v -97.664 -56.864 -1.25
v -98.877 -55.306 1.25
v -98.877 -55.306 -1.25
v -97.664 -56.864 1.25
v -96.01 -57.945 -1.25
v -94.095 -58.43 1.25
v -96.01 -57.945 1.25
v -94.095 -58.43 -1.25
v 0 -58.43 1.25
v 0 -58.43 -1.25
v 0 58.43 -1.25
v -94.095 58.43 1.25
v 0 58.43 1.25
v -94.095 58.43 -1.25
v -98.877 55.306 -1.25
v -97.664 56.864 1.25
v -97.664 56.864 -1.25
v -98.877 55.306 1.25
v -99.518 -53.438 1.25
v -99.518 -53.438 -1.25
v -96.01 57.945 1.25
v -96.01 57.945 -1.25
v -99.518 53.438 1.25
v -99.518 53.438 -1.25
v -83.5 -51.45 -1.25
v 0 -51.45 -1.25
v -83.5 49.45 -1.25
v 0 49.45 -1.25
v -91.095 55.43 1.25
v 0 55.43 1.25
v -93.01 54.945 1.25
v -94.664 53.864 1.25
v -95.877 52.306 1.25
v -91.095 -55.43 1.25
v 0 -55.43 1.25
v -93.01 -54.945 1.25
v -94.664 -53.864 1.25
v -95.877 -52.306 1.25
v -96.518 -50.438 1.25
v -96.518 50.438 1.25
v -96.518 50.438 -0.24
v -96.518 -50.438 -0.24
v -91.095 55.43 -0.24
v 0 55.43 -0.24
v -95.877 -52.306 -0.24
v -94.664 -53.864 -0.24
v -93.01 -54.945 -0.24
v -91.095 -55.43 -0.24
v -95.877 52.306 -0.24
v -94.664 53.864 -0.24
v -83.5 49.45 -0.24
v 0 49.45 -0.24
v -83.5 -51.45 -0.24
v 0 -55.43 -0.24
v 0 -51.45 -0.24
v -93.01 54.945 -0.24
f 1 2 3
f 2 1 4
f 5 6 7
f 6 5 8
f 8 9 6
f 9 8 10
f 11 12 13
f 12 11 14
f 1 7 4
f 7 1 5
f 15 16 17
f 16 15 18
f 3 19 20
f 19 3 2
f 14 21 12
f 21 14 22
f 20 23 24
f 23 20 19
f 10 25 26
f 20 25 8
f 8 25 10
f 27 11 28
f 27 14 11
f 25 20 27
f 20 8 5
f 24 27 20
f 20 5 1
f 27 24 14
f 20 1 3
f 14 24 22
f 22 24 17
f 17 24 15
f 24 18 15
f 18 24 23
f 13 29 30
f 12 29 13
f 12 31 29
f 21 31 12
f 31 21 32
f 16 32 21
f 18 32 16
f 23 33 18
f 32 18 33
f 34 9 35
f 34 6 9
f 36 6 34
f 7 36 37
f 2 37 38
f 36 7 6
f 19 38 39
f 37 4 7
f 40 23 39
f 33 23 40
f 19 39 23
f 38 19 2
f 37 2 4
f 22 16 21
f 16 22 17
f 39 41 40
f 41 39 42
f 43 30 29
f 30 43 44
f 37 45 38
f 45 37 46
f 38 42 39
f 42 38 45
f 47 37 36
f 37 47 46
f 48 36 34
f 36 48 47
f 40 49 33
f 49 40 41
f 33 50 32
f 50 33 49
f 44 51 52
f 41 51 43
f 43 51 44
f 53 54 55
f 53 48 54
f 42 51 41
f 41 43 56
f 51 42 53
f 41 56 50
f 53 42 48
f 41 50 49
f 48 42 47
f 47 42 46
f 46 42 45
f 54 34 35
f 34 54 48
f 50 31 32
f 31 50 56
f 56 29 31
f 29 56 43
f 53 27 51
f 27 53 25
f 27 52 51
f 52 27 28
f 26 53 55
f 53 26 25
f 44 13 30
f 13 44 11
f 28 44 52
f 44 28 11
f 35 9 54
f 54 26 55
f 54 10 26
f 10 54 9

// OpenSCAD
side=1;
wid1=110.9;

if (side==1) {
    difference() {
        touch_screen();
        translate([100,0,0]) cube([200,200,200],true);
    }
}
else if (side==2) {
    difference() {
        touch_screen();
        translate([-100,0,0]) cube([200,200,200],true);
    }
}


module touch_screen() {
    difference() {
        minkowski() {
            //cube([193.2+6,wid1+6,1.5],true);
            cube([193.2-6,wid1-6,2.5/2.],true);
            cylinder(r=6,h=2.5/2.,center=true);
        }

        translate([0,0,0.51]) minkowski() {
            cube([193.2-6-6,wid1-6-6,1.5/2],true);
            cylinder(r=6,h=1.5/2.,center=true);
        }
        
        translate([0,-1,0]) cube([167,100.9,5],true);
        
        //translate([126./2.,wid1/2+2.9,0]) cube([6,6,5],true);
        //translate([-126./2.,wid1/2+2.9,0]) cube([6,6,5],true);
    }

}
